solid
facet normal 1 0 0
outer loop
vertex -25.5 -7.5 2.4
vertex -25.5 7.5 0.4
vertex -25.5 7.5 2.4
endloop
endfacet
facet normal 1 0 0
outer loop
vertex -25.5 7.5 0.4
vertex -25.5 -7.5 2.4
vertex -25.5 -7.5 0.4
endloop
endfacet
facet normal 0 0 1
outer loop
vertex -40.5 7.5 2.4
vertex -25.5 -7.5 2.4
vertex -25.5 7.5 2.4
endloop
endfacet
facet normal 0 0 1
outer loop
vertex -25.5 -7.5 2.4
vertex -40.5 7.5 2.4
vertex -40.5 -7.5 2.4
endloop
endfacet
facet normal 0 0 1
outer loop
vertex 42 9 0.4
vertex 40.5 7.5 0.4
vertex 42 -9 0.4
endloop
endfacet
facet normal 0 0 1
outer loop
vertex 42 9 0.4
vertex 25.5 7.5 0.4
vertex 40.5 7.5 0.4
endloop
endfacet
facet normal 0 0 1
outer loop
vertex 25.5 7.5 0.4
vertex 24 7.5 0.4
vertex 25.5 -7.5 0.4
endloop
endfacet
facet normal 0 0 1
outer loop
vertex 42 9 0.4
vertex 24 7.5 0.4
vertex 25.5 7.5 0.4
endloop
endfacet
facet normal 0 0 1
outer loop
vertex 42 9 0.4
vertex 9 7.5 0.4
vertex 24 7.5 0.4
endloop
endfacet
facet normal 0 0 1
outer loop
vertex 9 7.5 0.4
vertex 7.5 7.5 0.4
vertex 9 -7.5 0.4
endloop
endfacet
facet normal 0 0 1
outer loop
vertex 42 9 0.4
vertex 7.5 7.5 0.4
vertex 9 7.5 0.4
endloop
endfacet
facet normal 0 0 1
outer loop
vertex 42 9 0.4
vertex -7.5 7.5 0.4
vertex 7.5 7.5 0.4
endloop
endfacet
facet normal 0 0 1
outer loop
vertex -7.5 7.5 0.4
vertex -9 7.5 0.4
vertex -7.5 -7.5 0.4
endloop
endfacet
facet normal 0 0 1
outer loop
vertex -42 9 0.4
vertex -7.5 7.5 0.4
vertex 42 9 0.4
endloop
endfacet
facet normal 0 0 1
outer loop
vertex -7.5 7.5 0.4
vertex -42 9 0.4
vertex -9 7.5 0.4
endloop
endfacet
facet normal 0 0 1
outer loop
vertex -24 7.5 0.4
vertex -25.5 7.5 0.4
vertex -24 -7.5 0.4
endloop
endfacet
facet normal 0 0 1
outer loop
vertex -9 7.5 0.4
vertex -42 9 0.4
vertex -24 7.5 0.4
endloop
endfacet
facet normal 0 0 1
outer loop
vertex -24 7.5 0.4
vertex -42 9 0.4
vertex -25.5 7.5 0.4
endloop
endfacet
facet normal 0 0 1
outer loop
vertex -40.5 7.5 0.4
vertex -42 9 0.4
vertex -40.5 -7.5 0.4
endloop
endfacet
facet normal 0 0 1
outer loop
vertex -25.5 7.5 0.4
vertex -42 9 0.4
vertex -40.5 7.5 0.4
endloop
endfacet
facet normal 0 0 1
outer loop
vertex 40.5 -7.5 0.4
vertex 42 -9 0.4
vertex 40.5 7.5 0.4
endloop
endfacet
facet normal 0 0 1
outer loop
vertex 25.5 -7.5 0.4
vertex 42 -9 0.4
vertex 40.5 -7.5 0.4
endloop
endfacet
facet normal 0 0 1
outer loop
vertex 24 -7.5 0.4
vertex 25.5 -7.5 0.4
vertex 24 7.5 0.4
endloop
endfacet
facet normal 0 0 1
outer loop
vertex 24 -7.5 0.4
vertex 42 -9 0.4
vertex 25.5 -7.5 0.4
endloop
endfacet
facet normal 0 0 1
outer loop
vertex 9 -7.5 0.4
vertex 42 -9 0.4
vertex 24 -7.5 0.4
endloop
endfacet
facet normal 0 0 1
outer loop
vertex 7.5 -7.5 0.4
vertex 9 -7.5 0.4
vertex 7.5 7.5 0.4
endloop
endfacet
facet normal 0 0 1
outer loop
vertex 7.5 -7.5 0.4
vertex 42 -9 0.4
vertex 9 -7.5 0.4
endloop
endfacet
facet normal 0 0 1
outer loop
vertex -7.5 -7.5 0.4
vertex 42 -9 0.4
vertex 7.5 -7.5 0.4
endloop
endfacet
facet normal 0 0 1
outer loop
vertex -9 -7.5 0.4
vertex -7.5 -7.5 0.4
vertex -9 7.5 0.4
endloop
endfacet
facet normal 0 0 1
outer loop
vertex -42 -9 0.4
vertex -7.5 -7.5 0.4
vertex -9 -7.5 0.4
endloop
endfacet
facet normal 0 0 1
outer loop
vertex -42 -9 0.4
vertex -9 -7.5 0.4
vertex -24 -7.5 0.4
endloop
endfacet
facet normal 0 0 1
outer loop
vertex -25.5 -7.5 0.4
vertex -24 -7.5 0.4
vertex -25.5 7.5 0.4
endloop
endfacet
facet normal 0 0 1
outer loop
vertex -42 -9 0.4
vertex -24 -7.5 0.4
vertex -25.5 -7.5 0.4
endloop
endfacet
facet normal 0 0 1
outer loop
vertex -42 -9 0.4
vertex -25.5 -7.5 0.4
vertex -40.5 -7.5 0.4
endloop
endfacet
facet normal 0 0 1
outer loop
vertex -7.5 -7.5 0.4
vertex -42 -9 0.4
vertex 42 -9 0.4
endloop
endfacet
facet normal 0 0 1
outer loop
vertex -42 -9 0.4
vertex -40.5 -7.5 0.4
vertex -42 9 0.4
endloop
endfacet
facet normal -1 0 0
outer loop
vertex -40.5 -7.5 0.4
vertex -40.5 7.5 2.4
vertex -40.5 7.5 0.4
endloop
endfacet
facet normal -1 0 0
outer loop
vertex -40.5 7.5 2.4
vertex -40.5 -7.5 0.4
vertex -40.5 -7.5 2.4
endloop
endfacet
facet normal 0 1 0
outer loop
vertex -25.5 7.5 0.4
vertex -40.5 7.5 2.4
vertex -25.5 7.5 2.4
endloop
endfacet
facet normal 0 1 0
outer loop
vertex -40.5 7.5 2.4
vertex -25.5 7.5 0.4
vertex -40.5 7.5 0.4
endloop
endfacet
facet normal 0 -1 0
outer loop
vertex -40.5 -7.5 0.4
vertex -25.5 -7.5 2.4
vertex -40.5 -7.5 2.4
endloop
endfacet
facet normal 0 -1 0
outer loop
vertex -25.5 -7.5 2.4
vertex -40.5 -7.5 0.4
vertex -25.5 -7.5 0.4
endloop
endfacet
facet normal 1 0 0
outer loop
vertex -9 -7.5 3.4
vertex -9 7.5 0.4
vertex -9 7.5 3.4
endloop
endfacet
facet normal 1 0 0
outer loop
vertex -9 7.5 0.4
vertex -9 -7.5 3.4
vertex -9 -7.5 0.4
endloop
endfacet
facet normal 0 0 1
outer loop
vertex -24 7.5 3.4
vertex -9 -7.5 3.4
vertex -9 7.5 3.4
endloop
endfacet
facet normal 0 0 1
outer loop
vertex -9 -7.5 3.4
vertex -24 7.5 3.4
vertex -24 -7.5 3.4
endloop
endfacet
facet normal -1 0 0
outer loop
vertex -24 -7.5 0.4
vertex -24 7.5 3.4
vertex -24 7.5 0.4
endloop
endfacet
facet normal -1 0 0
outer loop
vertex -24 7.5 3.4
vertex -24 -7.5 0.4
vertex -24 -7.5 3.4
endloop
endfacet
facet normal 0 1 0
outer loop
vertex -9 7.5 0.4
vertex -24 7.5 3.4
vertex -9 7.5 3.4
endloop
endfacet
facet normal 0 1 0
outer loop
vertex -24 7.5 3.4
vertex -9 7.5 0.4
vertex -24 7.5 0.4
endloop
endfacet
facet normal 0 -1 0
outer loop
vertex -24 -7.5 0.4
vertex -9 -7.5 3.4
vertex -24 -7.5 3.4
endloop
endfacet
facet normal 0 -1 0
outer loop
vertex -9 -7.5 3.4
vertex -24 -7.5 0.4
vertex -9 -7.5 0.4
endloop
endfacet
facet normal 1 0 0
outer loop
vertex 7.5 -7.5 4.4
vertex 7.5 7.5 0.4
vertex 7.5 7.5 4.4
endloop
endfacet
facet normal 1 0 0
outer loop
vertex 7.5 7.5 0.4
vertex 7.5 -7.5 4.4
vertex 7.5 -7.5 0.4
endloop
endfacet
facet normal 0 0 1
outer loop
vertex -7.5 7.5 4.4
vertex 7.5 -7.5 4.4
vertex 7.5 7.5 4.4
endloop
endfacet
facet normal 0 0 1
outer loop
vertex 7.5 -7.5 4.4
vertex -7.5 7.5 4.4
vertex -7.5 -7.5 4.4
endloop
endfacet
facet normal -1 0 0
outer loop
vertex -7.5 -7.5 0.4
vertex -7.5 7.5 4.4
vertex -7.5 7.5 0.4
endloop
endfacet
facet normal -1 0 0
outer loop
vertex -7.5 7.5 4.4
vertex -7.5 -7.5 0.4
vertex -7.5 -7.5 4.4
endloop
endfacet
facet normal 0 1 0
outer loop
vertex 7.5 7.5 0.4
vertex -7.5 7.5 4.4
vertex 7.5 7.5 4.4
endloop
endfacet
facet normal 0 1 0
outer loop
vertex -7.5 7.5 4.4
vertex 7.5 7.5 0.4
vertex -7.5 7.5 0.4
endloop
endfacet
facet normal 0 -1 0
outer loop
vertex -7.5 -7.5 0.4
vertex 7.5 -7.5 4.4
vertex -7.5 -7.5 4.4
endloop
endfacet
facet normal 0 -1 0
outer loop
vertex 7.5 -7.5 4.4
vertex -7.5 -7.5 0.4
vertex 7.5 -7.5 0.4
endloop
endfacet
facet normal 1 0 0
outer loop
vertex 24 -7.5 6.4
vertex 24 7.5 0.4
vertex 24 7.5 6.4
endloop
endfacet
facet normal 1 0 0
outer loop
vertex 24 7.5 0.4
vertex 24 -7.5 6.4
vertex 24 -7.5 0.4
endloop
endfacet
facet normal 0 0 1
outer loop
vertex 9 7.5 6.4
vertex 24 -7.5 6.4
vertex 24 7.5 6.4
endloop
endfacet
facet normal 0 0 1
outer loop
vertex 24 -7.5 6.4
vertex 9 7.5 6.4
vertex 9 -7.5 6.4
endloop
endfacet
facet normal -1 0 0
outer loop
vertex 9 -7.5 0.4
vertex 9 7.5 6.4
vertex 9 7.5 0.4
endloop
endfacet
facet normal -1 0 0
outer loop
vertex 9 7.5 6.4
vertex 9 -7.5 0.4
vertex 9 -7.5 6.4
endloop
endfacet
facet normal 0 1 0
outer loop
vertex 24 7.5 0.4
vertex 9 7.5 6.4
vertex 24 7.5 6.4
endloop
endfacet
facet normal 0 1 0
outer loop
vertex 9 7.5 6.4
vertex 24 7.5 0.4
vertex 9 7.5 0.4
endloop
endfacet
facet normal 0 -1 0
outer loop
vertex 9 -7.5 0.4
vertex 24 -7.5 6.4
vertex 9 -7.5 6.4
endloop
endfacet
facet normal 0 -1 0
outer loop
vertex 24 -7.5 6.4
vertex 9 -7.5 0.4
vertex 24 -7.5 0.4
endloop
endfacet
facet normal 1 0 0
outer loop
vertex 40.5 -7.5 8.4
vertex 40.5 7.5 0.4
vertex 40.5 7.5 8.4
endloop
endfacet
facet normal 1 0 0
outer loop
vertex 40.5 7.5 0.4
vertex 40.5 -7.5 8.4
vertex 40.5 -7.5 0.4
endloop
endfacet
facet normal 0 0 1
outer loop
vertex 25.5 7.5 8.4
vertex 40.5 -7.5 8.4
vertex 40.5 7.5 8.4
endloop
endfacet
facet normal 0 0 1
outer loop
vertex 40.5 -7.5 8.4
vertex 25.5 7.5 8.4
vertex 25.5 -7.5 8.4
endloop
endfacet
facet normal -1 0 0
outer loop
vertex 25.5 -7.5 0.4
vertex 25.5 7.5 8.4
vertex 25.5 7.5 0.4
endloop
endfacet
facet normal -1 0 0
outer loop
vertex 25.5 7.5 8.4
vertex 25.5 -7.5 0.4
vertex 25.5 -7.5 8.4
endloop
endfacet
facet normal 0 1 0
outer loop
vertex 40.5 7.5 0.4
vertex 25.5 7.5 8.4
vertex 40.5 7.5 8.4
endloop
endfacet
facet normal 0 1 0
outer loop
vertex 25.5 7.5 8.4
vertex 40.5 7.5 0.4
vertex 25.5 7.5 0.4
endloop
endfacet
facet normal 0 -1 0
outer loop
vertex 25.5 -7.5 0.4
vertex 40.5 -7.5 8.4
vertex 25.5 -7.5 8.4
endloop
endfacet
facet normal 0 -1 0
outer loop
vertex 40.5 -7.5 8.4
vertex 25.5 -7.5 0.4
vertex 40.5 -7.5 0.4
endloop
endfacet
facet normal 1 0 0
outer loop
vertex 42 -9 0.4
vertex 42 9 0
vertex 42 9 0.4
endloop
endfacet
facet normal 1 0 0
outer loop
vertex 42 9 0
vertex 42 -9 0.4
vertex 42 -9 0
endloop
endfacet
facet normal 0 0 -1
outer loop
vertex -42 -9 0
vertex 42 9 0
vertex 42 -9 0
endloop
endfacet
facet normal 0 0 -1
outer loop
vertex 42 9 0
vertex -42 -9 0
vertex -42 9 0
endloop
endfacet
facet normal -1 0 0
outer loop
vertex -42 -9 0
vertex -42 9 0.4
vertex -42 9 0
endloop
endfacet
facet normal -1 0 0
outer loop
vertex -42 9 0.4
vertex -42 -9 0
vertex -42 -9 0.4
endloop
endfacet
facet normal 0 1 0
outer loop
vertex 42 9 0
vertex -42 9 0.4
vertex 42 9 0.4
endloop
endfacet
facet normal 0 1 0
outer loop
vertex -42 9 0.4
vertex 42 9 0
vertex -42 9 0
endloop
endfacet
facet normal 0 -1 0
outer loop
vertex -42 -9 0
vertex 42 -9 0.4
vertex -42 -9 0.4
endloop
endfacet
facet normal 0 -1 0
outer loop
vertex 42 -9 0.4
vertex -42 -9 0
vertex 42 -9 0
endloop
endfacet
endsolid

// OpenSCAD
// KY-003 Sensing-Axis Standoff Cube Kit (Jig 18)
// ===========================================================================
// Companion print to Jig 17 (ky003-hall-fit.scad) for measuring the max
// reliable magnet-to-marked-face standoff of the BOM "Hall sensors KY-003"
// with YOUR float magnet. NOT a fit jig — a measurement aid.
//
// Why: the dock housing must keep the float magnet close enough to toggle the
// A3144 (unipolar, operate 35-450 G per Algred D.S. 27621.6B). The usable gap
// depends on the magnet strength nobody has specced yet, so the real number
// has to be measured: stand a cube on the exposed A3144 marked face, place
// the actual magnet on top of the cube — if the module toggles, that gap
// works; if not, try the next-thinner cube. Caliper-check cube height before
// trusting it (measure, don't assume layer height is exact).
//
// Each cube's Z HEIGHT == the standoff it represents (mm). A 0.4 mm base slab
// bonds the strip; pop cubes off cleanly with pliers. Height of each cube is
// its standoff value + 0.4 base — the standoff VALUE is what the face-to-cube
// dimension must be, so set it directly in `cube_h` (incl. the base). The
// cubes print flat (no supports, no overhang) and are deliberately oversized
// (15x15) so a Ø6-10 mm magnet sits stably on top.
//
// Provenance: cube heights 2/3/4/6/8 are (estimate) probe set — add/remove
// values to bracket YOUR magnet. No datasheet dependency here; the A3144
// operate/release figures come from the model (Allegro D.S. 27621.6B).
//
// Pass criteria + procedure: PRINT-TEST.md Jig 18.
// License: CC BY-SA 4.0

$fn = 48;

/* [Jig dimensions - EDIT] */
cube_h   = [2, 3, 4, 6, 8]; // mm (estimate) standoff values to probe
cube_xy  = 15;              // mm cube footprint (oversized for magnet stability)
base_t   = 0.4;             // mm breakaway base slab thickness
spacing  = 1.5;             // mm between cubes

// ===== STRIP =====
L = len(cube_h) * (cube_xy + spacing) + spacing; // strip length
W = cube_xy + 2 * spacing;                       // strip width

// base slab — floor at z = 0, top at z = base_t, fused to every cube above it
translate([0, 0, base_t/2]) cube([L, W, base_t], center = true);

// cubes (each pops off the slab)
for (k = [0 : len(cube_h)-1]) {
    x = -(L/2) + spacing + k * (cube_xy + spacing) + cube_xy/2;
    // cube sits ON the base slab: z spans [base_t, base_t + cube_h[k]] so
    // that standoff value == cube height above the slab/face. Cube is NOT
    // centered on z here — base_t + cube_h/2 puts the top at exactly the
    // standoff height.
    translate([x, 0, base_t + cube_h[k]/2])
        cube([cube_xy, cube_xy, cube_h[k]], center = true);
}
